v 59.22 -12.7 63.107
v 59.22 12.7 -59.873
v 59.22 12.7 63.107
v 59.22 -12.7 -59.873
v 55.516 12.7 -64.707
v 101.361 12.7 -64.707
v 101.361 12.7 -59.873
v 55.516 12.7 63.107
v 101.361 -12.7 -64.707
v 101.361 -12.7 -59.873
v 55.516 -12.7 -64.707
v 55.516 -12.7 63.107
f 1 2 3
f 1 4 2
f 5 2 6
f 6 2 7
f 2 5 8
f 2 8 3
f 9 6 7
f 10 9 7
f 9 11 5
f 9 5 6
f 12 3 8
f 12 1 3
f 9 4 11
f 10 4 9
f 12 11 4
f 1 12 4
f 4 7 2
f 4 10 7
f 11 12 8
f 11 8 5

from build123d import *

# Parameters (mm, degrees)
F3_DEPTH = 12.7


# Not quite as in the source:
# - the program builds the solid bodies; features that only make, move or delete a surface that nothing else refers to are left out


with BuildPart() as f3:
    # F2 (on Front) → F3 (new body, symmetric)
    with BuildSketch(Plane.XZ):
        Polygon((59.2198967934, 63.1065145135), (55.5164813995, 63.1065145135), (55.5164813995, -59.8734021187), (55.5164813995, -64.7067055106), (101.3612598181, -64.7067055106), (101.3612598181, -59.8734021187), (59.2198967934, -59.8734021187), align=None)
    extrude(amount=F3_DEPTH, both=True)


solid = f3.part
